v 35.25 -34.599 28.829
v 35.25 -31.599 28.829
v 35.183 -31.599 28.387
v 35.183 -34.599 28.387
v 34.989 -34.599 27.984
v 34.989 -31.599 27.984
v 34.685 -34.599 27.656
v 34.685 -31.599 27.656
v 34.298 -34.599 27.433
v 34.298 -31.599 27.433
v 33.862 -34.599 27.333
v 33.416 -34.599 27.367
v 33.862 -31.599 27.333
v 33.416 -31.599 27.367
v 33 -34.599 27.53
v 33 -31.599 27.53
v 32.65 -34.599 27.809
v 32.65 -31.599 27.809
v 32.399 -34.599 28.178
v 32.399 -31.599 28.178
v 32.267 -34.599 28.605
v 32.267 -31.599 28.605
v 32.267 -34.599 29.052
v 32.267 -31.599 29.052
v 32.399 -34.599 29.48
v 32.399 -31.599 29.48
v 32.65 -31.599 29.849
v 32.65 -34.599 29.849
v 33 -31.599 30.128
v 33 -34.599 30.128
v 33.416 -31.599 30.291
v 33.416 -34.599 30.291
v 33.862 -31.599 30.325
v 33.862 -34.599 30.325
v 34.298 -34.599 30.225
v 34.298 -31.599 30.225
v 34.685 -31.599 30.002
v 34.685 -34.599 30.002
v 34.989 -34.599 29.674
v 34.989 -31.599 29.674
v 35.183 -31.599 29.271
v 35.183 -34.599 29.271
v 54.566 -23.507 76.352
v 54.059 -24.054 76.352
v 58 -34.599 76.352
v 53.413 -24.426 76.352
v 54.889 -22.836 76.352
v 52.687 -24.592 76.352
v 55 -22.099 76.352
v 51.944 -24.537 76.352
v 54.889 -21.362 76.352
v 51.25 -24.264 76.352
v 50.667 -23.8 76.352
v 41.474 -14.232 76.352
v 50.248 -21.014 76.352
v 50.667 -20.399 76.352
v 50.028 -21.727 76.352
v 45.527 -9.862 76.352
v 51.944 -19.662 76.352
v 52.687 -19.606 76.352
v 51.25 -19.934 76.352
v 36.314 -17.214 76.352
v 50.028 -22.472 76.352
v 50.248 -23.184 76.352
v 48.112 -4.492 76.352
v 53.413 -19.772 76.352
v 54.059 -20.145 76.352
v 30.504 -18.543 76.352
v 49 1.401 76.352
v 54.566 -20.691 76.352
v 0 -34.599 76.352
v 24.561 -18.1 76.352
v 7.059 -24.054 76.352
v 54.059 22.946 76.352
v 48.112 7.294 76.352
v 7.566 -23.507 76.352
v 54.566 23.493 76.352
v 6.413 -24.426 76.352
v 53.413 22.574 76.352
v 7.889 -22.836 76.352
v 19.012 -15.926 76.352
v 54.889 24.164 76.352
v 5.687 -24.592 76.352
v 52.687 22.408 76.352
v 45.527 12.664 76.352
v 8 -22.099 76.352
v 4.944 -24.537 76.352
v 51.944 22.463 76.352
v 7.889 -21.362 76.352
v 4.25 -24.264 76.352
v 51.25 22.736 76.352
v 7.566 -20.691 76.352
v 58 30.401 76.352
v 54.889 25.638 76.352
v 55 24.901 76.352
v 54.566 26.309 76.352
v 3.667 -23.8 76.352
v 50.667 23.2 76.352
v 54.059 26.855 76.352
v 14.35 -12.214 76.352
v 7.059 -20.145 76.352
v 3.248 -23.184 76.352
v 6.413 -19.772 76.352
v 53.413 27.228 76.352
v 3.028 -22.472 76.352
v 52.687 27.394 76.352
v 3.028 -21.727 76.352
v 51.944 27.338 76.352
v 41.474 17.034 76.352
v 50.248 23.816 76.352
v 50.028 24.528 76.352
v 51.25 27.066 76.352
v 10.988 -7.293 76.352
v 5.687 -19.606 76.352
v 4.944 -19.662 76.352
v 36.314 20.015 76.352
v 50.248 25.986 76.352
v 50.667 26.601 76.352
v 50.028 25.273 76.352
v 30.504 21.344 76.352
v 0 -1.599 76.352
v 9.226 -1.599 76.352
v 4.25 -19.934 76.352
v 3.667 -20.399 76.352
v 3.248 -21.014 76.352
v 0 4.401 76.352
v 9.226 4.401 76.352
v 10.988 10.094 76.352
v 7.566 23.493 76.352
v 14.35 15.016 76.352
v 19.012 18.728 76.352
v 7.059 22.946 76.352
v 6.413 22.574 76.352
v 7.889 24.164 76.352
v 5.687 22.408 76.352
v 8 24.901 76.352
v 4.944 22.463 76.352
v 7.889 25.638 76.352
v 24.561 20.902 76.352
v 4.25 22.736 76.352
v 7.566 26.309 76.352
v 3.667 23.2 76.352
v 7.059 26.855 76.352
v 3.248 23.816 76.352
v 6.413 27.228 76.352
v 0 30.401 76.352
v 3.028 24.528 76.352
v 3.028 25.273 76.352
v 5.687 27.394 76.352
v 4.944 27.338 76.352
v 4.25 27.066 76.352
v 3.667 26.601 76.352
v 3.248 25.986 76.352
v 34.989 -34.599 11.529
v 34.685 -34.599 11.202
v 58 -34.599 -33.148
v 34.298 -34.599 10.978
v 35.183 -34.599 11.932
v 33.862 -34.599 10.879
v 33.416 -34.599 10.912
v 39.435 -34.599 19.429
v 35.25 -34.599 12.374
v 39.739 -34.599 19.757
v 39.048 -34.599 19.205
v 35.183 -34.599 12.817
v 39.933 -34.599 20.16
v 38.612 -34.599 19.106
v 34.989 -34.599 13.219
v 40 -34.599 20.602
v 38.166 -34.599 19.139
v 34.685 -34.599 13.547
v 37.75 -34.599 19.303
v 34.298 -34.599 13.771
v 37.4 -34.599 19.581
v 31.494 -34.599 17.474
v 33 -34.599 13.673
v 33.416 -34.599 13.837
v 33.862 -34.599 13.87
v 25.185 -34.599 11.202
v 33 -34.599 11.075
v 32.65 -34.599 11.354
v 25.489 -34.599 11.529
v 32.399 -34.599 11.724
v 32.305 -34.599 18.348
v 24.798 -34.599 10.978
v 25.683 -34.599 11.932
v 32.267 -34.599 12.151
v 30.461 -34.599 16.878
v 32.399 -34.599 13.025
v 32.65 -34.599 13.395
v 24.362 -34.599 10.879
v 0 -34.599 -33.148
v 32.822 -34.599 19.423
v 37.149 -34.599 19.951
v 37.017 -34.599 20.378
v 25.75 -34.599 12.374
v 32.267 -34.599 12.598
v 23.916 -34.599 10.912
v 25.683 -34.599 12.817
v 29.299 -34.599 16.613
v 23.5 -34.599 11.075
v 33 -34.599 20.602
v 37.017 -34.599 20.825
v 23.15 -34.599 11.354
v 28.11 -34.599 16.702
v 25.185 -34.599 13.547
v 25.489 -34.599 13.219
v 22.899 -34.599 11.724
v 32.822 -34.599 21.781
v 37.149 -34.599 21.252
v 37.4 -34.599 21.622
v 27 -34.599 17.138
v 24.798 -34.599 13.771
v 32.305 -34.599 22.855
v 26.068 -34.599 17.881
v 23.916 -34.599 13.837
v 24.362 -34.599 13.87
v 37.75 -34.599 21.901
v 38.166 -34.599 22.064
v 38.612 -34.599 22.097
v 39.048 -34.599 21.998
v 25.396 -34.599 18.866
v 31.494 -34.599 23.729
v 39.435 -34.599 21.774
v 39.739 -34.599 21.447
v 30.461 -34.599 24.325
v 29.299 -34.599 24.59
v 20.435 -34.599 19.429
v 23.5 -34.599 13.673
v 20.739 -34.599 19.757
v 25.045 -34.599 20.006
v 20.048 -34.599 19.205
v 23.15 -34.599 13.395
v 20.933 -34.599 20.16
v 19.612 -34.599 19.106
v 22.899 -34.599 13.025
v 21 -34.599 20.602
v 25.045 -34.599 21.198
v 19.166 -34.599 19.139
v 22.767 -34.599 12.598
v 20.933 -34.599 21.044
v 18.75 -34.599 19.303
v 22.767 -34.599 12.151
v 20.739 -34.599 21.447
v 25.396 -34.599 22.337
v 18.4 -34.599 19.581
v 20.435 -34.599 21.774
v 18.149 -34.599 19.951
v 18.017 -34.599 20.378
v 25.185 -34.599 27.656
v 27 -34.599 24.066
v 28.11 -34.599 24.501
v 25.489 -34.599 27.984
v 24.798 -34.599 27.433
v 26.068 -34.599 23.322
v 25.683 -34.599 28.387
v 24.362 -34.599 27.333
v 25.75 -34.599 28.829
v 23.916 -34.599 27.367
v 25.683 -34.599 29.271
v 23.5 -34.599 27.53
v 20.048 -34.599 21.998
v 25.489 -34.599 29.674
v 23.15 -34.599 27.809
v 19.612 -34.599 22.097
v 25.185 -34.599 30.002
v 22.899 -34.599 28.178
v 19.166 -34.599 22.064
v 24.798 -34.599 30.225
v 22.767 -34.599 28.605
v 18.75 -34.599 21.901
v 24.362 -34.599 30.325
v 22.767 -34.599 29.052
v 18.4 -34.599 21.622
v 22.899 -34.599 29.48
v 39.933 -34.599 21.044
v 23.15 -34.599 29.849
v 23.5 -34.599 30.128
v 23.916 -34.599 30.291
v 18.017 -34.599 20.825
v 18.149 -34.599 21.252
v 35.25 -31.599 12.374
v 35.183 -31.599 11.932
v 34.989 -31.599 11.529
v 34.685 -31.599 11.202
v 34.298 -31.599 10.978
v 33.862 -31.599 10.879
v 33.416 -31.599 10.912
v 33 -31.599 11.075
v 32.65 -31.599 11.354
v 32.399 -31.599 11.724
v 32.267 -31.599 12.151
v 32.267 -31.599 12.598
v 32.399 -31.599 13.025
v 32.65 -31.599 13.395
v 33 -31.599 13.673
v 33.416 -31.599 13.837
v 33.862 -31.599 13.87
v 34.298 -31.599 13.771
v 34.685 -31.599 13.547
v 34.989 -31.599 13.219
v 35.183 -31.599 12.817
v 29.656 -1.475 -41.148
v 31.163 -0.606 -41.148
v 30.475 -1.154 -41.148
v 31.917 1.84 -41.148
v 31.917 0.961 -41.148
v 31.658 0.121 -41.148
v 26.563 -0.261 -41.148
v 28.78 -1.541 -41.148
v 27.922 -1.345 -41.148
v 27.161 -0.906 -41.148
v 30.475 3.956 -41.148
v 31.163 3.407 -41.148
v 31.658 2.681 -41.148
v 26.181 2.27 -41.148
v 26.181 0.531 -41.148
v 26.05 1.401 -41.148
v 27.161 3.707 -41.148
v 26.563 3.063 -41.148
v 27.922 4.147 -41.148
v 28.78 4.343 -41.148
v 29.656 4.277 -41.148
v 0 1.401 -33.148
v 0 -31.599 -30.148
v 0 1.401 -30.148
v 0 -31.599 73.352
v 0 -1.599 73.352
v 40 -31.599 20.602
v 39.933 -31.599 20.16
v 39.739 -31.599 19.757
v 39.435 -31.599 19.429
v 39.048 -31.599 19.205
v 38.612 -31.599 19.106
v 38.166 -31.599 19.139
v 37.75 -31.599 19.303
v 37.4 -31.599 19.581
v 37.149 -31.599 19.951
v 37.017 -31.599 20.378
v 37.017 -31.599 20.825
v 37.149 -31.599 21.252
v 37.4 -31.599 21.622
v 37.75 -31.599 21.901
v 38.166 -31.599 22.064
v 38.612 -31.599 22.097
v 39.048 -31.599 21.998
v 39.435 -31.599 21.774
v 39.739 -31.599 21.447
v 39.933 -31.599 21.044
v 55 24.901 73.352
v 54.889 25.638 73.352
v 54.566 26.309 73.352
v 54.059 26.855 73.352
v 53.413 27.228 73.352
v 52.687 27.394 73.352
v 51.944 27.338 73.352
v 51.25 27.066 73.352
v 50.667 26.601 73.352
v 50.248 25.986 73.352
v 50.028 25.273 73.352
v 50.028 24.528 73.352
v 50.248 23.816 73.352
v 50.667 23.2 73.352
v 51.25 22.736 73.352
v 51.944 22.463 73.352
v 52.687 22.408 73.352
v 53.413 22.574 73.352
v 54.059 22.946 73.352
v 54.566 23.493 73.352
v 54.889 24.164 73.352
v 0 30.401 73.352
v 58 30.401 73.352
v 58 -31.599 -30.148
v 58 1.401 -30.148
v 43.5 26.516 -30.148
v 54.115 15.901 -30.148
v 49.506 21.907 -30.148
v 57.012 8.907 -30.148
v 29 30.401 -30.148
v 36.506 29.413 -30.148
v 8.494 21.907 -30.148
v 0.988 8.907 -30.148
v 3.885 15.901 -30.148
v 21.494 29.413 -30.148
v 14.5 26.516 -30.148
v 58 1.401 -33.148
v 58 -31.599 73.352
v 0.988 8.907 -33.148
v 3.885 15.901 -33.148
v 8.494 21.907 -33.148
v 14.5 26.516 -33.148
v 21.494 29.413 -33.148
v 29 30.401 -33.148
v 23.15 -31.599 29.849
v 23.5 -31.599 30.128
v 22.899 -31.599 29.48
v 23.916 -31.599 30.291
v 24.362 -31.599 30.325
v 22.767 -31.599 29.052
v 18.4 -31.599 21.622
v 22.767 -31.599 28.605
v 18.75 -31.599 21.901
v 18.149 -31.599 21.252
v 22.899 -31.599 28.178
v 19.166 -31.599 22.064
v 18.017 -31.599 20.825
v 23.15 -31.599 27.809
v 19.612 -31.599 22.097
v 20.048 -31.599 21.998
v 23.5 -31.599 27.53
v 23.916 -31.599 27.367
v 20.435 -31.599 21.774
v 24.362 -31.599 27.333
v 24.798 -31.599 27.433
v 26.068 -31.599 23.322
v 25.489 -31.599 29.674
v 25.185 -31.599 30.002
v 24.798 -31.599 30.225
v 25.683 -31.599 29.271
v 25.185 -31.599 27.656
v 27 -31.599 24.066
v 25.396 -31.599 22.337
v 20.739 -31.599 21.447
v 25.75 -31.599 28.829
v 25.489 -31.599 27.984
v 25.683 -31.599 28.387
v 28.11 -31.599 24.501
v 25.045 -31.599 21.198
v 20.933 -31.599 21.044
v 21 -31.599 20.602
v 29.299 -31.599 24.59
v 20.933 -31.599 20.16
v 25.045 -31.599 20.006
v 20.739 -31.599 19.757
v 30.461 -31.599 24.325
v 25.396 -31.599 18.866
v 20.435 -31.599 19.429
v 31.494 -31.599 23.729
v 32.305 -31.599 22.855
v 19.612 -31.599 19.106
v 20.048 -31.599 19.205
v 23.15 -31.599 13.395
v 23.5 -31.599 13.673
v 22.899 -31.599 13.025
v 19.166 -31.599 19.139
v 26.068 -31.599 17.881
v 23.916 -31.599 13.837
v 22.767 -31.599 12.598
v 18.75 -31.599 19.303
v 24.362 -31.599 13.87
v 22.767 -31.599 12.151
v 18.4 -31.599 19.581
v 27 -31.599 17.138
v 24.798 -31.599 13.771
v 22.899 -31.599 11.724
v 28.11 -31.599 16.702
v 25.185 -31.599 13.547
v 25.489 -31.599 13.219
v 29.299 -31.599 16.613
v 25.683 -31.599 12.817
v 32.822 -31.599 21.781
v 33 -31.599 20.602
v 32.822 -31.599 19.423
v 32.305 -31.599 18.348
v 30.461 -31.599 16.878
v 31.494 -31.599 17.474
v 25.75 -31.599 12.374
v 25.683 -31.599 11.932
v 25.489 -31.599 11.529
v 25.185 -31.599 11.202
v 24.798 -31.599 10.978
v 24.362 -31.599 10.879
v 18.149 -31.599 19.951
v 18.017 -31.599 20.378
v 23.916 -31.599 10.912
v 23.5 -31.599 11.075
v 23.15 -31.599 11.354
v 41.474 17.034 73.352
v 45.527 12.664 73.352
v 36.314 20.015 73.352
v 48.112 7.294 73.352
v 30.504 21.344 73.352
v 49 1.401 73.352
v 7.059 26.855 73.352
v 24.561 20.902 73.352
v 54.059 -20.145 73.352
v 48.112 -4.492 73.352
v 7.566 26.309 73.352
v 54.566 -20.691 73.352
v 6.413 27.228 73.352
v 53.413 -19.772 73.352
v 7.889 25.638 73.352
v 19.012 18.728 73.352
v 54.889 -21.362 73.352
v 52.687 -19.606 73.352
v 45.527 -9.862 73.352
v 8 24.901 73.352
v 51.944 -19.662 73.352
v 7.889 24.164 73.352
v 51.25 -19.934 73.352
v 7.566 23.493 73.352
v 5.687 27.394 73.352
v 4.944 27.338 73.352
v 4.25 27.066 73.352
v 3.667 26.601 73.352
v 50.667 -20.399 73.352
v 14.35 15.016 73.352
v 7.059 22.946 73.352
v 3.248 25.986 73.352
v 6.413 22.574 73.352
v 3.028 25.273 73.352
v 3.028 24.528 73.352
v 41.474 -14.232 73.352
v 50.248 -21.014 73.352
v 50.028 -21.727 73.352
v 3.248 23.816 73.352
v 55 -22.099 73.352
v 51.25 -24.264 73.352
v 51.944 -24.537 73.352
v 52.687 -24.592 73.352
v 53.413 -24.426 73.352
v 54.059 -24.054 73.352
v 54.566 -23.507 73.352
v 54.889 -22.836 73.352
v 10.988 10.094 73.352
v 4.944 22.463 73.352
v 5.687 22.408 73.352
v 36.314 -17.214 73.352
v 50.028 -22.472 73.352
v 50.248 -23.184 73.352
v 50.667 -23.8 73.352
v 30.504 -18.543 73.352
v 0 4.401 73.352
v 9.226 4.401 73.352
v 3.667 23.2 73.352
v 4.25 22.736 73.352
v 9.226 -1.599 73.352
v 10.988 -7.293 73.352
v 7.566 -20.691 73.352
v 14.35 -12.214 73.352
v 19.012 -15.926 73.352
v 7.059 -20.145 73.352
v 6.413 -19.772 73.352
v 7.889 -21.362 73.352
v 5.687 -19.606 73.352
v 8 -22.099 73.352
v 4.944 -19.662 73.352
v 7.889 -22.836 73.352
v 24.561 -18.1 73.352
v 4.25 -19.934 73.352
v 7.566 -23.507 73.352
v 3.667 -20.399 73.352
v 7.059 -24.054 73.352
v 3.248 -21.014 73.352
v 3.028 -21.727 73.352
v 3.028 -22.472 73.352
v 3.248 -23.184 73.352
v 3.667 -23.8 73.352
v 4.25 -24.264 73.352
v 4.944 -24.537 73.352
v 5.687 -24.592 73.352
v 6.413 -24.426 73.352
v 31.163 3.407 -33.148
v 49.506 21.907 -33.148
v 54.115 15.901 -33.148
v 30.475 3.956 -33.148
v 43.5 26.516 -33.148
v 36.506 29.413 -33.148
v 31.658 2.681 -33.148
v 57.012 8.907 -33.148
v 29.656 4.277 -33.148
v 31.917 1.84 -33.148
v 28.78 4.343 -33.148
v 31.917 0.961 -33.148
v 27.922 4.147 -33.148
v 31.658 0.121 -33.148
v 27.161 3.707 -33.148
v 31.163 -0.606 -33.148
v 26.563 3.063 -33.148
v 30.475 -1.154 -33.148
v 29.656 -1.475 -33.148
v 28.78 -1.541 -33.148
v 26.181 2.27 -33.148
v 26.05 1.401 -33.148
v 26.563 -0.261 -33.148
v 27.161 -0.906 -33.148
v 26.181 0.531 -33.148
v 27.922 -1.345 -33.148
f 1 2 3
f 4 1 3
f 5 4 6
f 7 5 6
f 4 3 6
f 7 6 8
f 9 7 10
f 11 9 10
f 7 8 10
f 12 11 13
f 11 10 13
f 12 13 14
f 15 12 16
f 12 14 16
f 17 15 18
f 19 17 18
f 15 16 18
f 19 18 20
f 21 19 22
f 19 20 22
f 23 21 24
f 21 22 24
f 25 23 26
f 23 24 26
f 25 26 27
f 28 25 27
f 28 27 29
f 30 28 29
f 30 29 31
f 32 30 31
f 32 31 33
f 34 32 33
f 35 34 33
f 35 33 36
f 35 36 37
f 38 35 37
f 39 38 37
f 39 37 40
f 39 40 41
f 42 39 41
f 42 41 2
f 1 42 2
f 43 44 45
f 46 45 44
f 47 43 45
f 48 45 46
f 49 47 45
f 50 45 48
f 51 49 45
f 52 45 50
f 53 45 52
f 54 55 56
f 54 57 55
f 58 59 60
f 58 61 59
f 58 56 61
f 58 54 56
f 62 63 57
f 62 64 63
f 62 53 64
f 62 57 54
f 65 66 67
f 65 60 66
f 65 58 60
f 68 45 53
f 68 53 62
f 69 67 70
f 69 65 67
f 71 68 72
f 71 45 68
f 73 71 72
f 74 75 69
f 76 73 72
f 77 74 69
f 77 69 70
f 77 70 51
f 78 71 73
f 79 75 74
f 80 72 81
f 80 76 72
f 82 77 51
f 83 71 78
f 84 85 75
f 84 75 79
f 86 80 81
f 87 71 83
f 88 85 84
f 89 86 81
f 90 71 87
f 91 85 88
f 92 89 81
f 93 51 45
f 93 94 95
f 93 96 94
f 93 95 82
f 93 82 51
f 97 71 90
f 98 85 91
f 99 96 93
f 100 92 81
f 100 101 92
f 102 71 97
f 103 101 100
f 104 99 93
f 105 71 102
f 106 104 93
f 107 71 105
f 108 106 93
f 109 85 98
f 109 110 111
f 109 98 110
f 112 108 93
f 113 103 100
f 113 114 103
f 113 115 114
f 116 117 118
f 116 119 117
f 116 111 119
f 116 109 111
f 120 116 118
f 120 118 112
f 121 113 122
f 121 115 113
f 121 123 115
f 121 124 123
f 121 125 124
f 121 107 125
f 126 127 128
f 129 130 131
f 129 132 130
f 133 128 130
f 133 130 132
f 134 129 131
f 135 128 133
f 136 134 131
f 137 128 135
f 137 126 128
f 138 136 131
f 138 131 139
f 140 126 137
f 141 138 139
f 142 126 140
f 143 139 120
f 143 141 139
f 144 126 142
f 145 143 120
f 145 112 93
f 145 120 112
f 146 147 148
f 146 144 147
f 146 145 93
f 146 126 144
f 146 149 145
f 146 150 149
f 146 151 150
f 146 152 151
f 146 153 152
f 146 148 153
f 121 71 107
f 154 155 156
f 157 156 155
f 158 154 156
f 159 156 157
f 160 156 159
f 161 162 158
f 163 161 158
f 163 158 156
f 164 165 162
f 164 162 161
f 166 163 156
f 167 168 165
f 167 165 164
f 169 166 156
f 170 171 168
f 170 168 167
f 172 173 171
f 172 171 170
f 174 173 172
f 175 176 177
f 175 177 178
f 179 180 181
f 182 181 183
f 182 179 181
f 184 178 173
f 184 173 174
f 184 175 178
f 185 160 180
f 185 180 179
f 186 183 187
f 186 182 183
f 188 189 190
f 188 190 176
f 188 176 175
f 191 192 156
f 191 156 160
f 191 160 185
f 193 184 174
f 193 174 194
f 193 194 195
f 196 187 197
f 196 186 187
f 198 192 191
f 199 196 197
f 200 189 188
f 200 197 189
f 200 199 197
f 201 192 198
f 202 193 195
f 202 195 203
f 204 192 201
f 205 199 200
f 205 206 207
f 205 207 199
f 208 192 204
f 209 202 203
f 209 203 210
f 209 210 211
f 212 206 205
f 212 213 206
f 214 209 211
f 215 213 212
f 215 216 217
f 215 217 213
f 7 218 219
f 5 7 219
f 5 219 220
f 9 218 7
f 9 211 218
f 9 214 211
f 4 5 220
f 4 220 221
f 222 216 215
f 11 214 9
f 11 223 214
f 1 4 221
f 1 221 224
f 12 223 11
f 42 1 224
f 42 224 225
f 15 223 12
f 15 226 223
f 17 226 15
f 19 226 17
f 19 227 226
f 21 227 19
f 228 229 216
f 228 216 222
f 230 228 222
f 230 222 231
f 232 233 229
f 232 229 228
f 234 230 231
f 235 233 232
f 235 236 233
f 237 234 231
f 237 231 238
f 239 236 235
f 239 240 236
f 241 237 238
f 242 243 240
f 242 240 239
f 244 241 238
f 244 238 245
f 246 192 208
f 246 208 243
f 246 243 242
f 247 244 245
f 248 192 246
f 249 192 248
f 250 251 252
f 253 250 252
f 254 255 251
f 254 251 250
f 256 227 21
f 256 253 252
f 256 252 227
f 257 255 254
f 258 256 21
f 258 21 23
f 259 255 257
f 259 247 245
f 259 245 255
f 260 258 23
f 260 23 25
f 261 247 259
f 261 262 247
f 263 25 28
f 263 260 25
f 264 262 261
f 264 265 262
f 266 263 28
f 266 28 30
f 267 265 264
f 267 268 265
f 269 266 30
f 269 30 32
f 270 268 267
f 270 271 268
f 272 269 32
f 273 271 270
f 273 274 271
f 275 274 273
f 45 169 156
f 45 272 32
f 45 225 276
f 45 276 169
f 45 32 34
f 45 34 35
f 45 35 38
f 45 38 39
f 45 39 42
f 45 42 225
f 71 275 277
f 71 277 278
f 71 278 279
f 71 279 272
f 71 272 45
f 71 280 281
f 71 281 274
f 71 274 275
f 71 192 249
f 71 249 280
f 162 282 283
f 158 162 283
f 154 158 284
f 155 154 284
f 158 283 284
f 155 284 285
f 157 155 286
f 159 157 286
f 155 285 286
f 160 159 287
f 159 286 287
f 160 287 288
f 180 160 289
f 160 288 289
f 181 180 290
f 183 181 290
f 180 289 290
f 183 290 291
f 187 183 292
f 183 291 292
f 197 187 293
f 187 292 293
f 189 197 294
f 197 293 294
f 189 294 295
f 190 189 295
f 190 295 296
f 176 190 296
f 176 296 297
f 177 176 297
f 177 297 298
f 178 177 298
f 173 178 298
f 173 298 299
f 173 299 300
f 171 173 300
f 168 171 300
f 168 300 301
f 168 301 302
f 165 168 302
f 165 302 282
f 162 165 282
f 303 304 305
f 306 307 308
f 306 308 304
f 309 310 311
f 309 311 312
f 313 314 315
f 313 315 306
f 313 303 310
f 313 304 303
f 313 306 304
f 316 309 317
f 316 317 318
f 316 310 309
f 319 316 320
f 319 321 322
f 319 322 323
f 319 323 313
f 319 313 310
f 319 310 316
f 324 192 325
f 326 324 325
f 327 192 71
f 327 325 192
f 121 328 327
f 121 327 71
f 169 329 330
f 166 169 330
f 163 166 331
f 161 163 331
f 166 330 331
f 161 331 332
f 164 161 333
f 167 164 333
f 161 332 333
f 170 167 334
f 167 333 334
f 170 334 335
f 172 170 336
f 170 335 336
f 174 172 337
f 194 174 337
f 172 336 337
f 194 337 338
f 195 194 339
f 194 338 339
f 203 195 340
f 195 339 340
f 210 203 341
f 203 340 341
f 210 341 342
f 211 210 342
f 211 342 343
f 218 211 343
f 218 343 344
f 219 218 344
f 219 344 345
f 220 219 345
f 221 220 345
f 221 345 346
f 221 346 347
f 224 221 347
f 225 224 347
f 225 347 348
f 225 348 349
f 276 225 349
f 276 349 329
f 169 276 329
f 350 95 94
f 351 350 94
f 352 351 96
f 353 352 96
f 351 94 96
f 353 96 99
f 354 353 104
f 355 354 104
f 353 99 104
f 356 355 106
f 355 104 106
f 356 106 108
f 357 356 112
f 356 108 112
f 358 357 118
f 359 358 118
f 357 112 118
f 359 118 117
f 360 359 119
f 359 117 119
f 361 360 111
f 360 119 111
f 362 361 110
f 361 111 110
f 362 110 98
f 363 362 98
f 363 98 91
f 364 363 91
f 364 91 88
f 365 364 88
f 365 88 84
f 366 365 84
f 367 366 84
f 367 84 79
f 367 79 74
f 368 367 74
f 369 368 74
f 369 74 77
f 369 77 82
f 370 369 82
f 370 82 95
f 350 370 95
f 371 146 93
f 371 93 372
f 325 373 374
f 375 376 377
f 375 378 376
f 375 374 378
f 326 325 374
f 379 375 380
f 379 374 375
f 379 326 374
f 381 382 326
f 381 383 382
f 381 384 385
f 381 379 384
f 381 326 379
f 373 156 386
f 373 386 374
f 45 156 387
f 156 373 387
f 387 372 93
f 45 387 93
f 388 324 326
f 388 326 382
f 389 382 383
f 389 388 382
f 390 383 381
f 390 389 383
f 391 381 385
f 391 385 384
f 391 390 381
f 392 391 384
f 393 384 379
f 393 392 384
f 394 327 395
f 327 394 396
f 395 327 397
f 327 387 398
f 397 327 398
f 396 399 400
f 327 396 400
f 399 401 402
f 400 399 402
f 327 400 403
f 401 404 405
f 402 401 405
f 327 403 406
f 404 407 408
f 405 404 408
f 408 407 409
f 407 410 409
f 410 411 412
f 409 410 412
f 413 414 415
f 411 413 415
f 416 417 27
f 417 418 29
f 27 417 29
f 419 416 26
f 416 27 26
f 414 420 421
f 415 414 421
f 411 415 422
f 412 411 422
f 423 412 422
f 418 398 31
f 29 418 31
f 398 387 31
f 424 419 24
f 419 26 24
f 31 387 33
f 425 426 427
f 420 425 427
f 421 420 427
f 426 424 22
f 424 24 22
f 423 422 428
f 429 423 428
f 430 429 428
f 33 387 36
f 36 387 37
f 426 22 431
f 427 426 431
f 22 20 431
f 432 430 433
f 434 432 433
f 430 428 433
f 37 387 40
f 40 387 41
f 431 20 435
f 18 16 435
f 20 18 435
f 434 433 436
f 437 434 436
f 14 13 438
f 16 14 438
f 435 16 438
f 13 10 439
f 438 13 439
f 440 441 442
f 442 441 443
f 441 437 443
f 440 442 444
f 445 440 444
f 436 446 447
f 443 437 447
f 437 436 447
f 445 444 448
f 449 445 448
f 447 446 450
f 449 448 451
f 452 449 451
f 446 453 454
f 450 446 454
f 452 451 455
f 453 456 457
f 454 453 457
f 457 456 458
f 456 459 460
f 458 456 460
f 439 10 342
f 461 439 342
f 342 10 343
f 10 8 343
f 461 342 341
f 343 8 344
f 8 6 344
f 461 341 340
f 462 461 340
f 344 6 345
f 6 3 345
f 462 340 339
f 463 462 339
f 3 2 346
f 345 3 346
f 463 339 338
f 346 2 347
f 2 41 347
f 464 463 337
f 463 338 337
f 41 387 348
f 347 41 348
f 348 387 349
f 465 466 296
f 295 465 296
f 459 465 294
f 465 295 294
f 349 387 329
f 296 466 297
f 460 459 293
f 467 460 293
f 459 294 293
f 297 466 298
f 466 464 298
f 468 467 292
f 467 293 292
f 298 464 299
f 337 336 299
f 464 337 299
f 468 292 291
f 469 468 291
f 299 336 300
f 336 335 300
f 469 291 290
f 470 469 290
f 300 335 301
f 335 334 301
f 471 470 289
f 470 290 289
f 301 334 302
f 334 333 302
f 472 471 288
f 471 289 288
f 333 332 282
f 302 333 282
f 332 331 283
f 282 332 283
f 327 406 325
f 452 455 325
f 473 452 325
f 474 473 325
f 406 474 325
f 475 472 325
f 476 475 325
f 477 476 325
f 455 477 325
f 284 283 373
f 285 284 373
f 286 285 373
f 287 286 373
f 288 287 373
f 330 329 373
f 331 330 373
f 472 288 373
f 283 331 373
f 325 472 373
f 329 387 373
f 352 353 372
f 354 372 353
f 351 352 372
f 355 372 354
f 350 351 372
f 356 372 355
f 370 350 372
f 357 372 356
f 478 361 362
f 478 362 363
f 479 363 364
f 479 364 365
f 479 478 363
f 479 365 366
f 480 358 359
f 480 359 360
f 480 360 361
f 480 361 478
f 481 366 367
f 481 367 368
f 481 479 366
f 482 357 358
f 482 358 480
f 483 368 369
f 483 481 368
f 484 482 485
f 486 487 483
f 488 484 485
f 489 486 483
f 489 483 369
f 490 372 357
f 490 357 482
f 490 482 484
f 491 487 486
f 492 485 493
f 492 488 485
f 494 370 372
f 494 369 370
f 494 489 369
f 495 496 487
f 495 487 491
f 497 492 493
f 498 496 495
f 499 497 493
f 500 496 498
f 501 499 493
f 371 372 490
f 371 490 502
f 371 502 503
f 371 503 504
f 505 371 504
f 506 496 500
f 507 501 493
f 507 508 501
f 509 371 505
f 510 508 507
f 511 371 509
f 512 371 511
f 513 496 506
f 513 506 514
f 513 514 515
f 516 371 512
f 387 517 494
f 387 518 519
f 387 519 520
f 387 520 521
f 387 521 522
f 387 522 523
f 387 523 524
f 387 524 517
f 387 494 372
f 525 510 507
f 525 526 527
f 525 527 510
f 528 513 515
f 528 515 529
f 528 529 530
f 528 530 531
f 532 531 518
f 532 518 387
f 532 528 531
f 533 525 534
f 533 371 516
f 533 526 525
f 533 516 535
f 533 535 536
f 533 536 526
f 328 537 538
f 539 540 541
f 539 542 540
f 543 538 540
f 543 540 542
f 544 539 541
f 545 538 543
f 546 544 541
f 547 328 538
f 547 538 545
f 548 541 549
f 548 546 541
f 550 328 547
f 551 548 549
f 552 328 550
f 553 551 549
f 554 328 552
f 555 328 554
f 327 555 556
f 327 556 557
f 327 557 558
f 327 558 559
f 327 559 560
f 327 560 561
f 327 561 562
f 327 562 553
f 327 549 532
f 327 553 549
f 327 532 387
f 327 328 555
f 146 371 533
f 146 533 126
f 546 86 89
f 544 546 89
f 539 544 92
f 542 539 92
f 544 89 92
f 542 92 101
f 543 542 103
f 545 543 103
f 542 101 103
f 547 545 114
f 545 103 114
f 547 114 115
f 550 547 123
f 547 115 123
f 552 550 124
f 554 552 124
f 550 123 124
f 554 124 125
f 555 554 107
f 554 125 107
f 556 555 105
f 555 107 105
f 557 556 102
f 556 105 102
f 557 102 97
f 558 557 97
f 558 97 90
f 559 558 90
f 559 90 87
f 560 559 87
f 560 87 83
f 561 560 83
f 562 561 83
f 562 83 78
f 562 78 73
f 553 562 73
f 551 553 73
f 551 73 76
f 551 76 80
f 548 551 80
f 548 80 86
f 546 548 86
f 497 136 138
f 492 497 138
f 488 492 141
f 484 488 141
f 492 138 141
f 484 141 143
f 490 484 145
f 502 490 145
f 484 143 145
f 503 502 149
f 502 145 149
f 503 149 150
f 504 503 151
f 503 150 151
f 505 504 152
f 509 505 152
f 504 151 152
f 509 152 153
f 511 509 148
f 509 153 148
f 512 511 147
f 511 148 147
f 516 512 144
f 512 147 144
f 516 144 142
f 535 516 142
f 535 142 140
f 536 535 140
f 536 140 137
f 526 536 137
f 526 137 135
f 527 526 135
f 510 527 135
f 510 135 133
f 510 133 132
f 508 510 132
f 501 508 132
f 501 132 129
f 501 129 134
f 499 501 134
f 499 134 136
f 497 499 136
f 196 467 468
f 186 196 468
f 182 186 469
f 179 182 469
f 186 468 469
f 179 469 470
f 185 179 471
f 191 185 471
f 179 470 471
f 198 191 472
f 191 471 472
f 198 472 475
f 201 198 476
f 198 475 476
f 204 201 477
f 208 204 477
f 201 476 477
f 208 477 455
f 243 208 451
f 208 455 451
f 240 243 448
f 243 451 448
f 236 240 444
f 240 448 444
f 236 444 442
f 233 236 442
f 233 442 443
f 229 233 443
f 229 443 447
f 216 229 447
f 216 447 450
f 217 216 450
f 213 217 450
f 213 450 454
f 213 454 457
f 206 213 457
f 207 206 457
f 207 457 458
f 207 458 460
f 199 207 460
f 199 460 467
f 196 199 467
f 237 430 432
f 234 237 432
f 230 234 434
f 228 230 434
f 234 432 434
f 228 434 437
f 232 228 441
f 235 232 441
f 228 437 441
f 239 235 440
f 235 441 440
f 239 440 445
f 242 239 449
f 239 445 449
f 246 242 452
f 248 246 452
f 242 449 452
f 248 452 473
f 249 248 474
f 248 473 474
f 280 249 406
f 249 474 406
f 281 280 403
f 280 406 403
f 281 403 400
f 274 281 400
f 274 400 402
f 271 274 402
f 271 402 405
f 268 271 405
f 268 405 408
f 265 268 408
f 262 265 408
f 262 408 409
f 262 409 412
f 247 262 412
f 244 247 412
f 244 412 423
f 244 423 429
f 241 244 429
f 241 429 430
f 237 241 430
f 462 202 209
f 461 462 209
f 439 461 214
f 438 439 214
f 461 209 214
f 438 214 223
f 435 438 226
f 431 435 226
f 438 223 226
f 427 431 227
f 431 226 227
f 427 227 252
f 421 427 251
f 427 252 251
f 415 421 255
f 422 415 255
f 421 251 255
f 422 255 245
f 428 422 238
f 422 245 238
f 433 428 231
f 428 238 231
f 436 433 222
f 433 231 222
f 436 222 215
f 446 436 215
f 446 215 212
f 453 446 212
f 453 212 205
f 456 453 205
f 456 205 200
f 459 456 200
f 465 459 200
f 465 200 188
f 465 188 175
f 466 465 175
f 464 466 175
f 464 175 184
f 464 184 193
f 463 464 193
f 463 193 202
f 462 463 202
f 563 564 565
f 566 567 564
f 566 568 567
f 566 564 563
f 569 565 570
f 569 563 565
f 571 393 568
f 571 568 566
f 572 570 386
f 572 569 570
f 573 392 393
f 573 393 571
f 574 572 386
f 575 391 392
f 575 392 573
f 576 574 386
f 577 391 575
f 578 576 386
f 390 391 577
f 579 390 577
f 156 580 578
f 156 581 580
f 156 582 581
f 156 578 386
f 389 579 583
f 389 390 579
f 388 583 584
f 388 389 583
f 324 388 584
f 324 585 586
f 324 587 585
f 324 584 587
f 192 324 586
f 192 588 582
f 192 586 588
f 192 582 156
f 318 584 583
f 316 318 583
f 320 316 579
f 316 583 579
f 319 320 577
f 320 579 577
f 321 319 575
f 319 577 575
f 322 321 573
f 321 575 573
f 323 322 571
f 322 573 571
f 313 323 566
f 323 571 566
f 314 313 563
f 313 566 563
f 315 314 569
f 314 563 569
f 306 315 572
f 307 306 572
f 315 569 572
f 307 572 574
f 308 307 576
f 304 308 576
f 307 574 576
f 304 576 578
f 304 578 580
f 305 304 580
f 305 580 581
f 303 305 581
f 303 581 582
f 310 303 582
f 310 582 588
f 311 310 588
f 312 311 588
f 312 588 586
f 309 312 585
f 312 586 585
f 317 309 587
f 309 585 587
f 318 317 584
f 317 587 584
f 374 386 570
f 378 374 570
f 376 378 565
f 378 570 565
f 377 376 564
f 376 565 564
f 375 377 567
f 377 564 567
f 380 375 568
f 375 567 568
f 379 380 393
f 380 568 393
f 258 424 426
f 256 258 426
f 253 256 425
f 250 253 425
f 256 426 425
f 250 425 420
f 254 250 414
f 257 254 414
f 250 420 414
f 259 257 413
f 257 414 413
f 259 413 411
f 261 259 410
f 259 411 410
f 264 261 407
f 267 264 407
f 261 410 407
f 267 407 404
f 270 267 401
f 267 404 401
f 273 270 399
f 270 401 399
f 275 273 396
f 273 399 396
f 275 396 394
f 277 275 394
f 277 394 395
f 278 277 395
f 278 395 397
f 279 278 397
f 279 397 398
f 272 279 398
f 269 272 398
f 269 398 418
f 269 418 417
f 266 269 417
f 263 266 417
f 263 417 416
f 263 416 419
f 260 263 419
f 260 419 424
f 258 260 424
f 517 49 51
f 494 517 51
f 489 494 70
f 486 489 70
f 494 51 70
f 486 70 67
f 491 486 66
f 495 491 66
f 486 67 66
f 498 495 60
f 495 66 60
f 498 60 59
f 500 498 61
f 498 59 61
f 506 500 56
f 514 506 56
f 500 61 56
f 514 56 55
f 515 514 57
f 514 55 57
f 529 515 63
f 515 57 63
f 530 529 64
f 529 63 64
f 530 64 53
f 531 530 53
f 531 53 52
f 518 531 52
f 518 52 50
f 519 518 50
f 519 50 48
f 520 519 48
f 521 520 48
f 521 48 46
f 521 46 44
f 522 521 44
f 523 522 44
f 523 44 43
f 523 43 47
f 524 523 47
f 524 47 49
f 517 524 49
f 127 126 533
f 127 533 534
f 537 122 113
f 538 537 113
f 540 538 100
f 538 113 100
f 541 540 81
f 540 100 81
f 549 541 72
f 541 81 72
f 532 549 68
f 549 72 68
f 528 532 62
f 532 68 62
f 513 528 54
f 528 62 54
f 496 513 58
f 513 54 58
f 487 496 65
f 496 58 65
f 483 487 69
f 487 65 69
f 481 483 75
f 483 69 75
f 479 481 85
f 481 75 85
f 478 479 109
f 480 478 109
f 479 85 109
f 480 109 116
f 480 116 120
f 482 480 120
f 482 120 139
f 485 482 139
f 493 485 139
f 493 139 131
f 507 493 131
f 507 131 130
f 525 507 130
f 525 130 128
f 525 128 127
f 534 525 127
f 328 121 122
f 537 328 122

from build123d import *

# Parameters (mm, degrees)
BOSS_EXTRUDE1_DEPTH = 58
SKETCH2_R           = 2.5
SKETCH2_R_2         = 20
CUT_EXTRUDE1_DEPTH  = 58
CUT_EXTRUDE2_DEPTH  = 58
CUT_EXTRUDE3_DEPTH  = 58
SKETCH5_R           = 2.95
BOSS_EXTRUDE2_DEPTH = 8
SKETCH7_W           = 29
SKETCH7_H           = 6
CUT_EXTRUDE5_DEPTH  = 10
SKETCH25_R          = 4
CUT_EXTRUDE6_DEPTH  = 10
SKETCH26_W          = 103.5
SKETCH26_H          = 2
CUT_EXTRUDE7_DEPTH  = 90
SKETCH29_R          = 1.5
CUT_EXTRUDE8_DEPTH  = 10


with BuildPart() as part:
    # Sketch1 → Boss-Extrude1 (new body)
    with BuildSketch(Plane(origin=(0, 0, 0), x_dir=(0, 0, -1), z_dir=(1, 0, 0))):
        Polygon((-73.351671883, 30.400809615), (-73.351671883, -29.599190385), (30.148328117, -29.599190385), (30.148328117, 30.400809615), (33.148328117, 30.400809615), (33.148328117, -34.599190385), (-76.351671883, -34.599190385), (-76.351671883, 30.400809615), align=None)
    extrude(amount=BOSS_EXTRUDE1_DEPTH)

    # Sketch2 → Cut-Extrude1 (cut)
    with BuildSketch(Plane.XY.offset(76.351671883)):
        with Locations((5.5, 24.900809615)):
            Circle(SKETCH2_R)
        with Locations((52.5, 24.900809615)):
            Circle(SKETCH2_R)
        with Locations((52.5, -22.099190385)):
            Circle(SKETCH2_R)
        with Locations((5.5, -22.099190385)):
            Circle(SKETCH2_R)
        with Locations((29, 1.400809615)):
            Circle(SKETCH2_R_2)
    extrude(amount=-CUT_EXTRUDE1_DEPTH, mode=Mode.SUBTRACT)

    # Sketch3 → Cut-Extrude2 (cut)
    with BuildSketch(Plane(origin=(0, 0, -33.148328117), x_dir=(-1, 0, 0), z_dir=(0, 0, -1))):
        with BuildLine():
            Line((-29, 30.400809615), (-58, 30.400809615))
            Line((-58, 30.400809615), (-58, 1.400809615))
            ThreePointArc((-58, 1.400809615), (-49.506096654, 21.90690627), (-29, 30.400809615))
        make_face()
    extrude(amount=-CUT_EXTRUDE2_DEPTH, mode=Mode.SUBTRACT)

    # Sketch4 → Cut-Extrude3 (cut)
    with BuildSketch(Plane(origin=(0, 0, -33.148328117), x_dir=(-1, 0, 0), z_dir=(0, 0, -1))):
        with BuildLine():
            Line((-29, 30.400809615), (0, 30.400809615))
            Line((0, 30.400809615), (0, 1.400809615))
            ThreePointArc((0, 1.400809615), (-8.493903346, 21.90690627), (-29, 30.400809615))
        make_face()
    extrude(amount=-CUT_EXTRUDE3_DEPTH, mode=Mode.SUBTRACT)

    # Sketch5 → Boss-Extrude2 (add)
    with BuildSketch(Plane(origin=(0, 0, -33.148328117), x_dir=(-1, 0, 0), z_dir=(0, 0, -1))):
        with Locations((-29, 1.400809615)):
            Circle(SKETCH5_R)
    extrude(amount=BOSS_EXTRUDE2_DEPTH)

    # Sketch7 → Cut-Extrude5 (cut)
    with BuildSketch(Plane.XY.offset(76.351671883)):
        with Locations((14.5, 1.400809615)):
            Rectangle(SKETCH7_W, SKETCH7_H)
    extrude(amount=-CUT_EXTRUDE5_DEPTH, mode=Mode.SUBTRACT)

    # Sketch25 → Cut-Extrude6 (cut)
    with BuildSketch(Plane.XZ.offset(34.599190385)):
        with Locations((29, 20.601671883)):
            Circle(SKETCH25_R)
    extrude(amount=-CUT_EXTRUDE6_DEPTH, mode=Mode.SUBTRACT)

    # Sketch26 → Cut-Extrude7 (cut)
    with BuildSketch(Plane(origin=(58, 0, 0), x_dir=(0, 0, -1), z_dir=(1, 0, 0))):
        with Locations((-21.601671883, -30.599190385)):
            Rectangle(SKETCH26_W, SKETCH26_H)
    extrude(amount=-CUT_EXTRUDE7_DEPTH, mode=Mode.SUBTRACT)

    # Sketch29 → Cut-Extrude8 (cut)
    with BuildSketch(Plane(origin=(0, -31.599190385, 0), x_dir=(1, 0, 0), z_dir=(0, 1, 0))):
        with Locations((19.5, -20.601671883)):
            Circle(SKETCH29_R)
        with Locations((24.25, -12.374430547)):
            Circle(SKETCH29_R)
        with Locations((33.75, -12.374430547)):
            Circle(SKETCH29_R)
        with Locations((38.5, -20.601671883)):
            Circle(SKETCH29_R)
        with Locations((33.75, -28.828913219)):
            Circle(SKETCH29_R)
        with Locations((24.25, -28.828913219)):
            Circle(SKETCH29_R)
    extrude(amount=-CUT_EXTRUDE8_DEPTH, mode=Mode.SUBTRACT)


solid = part.part
